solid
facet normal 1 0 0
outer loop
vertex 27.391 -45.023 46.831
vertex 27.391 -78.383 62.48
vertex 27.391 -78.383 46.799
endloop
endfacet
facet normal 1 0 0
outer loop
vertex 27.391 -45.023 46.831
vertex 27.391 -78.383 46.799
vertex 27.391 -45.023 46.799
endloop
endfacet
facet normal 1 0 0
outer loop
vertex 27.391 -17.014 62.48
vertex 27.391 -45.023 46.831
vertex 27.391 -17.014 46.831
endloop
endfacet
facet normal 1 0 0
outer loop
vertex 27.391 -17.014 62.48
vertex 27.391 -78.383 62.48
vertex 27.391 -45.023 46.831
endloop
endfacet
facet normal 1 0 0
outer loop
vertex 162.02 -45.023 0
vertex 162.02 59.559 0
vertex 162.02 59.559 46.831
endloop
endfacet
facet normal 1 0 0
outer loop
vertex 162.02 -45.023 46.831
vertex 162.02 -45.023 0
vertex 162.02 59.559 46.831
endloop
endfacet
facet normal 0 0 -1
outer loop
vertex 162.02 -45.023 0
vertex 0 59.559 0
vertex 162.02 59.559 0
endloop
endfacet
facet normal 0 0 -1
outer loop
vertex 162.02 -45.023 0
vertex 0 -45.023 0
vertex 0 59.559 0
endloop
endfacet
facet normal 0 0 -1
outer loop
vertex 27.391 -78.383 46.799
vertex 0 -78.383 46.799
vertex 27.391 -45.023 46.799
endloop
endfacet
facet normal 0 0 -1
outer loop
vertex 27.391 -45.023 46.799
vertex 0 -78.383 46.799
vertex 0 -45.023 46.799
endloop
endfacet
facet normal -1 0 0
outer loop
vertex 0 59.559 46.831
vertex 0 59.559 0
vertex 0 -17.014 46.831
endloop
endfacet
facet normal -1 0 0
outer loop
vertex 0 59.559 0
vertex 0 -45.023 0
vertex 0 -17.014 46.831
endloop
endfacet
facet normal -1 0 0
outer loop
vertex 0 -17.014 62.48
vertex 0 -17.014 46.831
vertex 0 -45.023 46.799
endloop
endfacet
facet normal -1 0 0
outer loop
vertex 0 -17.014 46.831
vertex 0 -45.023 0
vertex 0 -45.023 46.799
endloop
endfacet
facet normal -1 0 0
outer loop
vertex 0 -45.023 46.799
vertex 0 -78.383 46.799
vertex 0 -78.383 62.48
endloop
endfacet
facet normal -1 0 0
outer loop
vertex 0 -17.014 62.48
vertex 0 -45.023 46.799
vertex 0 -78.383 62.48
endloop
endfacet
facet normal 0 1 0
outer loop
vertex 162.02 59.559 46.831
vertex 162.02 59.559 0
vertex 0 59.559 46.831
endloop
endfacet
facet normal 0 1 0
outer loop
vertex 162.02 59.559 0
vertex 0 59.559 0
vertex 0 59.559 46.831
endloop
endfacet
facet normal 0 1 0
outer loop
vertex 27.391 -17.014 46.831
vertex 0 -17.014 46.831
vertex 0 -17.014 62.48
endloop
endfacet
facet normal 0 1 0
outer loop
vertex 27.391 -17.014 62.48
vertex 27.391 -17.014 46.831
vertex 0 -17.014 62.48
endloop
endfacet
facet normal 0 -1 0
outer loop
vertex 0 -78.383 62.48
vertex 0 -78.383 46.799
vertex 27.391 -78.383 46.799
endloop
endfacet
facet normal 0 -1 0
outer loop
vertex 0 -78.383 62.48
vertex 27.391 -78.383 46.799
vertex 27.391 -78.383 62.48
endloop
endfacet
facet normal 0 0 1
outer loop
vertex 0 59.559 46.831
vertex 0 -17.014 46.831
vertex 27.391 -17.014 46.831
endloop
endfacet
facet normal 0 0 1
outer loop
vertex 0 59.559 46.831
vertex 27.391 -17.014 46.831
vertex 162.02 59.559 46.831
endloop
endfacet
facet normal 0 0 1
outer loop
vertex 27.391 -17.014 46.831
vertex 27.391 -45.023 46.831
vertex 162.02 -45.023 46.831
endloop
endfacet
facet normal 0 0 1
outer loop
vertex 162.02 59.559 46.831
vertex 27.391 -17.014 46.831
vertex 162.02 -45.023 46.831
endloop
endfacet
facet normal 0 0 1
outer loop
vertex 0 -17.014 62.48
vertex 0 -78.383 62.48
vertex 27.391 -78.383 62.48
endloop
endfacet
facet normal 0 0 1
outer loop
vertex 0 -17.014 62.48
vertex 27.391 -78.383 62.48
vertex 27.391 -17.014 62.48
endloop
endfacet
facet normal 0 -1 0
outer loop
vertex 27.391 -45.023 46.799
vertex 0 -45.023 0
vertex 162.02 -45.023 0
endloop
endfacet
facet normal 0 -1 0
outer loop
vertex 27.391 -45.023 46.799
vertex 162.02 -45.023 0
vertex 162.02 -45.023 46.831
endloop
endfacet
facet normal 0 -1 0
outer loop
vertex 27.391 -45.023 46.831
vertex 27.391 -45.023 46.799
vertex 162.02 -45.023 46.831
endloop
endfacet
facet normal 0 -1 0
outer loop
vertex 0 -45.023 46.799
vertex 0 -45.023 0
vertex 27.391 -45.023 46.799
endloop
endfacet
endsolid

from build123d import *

# Parameters (mm, degrees)
F0_W     = 52.7686178684
F0_H     = 46.8310452998
F1_DEPTH = 45.0226236135
F2_W     = 61.3688528538
F2_H     = 15.6810022891
F3_DEPTH = 27.3912083358
F4_DEPTH = 109.2513594776
F5_DEPTH = 59.5592800528


# Not quite as in the source:
# - a feature names something its author has since deleted; it is built from what else it names


with BuildPart() as f1:
    # F0 (on Front) → F1 (new body)
    with BuildSketch(Plane.XZ):
        with Locations((26.3843089342, 23.4155226499)):
            Rectangle(F0_W, F0_H)
    extrude(amount=F1_DEPTH)

    # F2 (on Right) → F3 (join)
    with BuildSketch(Plane.YZ):
        with Locations((-47.6985424757, 54.6393077821)):
            Rectangle(F2_W, F2_H)
    extrude(amount=F3_DEPTH)

    # F4 (add): a face of the model
    f4_faces = [f1.faces().sort_by_distance(p)[0] for p in [
        (52.7686178684, -22.5113118067, 23.4155226499),
    ]]
    extrude(f4_faces, amount=F4_DEPTH)

    # F5 (add): a face of the model
    f5_faces = [f1.faces().sort_by_distance(p)[0] for p in [
        (81.009988673, 0, 23.4155226499),
    ]]
    extrude(f5_faces, amount=F5_DEPTH)


solid = f1.part
